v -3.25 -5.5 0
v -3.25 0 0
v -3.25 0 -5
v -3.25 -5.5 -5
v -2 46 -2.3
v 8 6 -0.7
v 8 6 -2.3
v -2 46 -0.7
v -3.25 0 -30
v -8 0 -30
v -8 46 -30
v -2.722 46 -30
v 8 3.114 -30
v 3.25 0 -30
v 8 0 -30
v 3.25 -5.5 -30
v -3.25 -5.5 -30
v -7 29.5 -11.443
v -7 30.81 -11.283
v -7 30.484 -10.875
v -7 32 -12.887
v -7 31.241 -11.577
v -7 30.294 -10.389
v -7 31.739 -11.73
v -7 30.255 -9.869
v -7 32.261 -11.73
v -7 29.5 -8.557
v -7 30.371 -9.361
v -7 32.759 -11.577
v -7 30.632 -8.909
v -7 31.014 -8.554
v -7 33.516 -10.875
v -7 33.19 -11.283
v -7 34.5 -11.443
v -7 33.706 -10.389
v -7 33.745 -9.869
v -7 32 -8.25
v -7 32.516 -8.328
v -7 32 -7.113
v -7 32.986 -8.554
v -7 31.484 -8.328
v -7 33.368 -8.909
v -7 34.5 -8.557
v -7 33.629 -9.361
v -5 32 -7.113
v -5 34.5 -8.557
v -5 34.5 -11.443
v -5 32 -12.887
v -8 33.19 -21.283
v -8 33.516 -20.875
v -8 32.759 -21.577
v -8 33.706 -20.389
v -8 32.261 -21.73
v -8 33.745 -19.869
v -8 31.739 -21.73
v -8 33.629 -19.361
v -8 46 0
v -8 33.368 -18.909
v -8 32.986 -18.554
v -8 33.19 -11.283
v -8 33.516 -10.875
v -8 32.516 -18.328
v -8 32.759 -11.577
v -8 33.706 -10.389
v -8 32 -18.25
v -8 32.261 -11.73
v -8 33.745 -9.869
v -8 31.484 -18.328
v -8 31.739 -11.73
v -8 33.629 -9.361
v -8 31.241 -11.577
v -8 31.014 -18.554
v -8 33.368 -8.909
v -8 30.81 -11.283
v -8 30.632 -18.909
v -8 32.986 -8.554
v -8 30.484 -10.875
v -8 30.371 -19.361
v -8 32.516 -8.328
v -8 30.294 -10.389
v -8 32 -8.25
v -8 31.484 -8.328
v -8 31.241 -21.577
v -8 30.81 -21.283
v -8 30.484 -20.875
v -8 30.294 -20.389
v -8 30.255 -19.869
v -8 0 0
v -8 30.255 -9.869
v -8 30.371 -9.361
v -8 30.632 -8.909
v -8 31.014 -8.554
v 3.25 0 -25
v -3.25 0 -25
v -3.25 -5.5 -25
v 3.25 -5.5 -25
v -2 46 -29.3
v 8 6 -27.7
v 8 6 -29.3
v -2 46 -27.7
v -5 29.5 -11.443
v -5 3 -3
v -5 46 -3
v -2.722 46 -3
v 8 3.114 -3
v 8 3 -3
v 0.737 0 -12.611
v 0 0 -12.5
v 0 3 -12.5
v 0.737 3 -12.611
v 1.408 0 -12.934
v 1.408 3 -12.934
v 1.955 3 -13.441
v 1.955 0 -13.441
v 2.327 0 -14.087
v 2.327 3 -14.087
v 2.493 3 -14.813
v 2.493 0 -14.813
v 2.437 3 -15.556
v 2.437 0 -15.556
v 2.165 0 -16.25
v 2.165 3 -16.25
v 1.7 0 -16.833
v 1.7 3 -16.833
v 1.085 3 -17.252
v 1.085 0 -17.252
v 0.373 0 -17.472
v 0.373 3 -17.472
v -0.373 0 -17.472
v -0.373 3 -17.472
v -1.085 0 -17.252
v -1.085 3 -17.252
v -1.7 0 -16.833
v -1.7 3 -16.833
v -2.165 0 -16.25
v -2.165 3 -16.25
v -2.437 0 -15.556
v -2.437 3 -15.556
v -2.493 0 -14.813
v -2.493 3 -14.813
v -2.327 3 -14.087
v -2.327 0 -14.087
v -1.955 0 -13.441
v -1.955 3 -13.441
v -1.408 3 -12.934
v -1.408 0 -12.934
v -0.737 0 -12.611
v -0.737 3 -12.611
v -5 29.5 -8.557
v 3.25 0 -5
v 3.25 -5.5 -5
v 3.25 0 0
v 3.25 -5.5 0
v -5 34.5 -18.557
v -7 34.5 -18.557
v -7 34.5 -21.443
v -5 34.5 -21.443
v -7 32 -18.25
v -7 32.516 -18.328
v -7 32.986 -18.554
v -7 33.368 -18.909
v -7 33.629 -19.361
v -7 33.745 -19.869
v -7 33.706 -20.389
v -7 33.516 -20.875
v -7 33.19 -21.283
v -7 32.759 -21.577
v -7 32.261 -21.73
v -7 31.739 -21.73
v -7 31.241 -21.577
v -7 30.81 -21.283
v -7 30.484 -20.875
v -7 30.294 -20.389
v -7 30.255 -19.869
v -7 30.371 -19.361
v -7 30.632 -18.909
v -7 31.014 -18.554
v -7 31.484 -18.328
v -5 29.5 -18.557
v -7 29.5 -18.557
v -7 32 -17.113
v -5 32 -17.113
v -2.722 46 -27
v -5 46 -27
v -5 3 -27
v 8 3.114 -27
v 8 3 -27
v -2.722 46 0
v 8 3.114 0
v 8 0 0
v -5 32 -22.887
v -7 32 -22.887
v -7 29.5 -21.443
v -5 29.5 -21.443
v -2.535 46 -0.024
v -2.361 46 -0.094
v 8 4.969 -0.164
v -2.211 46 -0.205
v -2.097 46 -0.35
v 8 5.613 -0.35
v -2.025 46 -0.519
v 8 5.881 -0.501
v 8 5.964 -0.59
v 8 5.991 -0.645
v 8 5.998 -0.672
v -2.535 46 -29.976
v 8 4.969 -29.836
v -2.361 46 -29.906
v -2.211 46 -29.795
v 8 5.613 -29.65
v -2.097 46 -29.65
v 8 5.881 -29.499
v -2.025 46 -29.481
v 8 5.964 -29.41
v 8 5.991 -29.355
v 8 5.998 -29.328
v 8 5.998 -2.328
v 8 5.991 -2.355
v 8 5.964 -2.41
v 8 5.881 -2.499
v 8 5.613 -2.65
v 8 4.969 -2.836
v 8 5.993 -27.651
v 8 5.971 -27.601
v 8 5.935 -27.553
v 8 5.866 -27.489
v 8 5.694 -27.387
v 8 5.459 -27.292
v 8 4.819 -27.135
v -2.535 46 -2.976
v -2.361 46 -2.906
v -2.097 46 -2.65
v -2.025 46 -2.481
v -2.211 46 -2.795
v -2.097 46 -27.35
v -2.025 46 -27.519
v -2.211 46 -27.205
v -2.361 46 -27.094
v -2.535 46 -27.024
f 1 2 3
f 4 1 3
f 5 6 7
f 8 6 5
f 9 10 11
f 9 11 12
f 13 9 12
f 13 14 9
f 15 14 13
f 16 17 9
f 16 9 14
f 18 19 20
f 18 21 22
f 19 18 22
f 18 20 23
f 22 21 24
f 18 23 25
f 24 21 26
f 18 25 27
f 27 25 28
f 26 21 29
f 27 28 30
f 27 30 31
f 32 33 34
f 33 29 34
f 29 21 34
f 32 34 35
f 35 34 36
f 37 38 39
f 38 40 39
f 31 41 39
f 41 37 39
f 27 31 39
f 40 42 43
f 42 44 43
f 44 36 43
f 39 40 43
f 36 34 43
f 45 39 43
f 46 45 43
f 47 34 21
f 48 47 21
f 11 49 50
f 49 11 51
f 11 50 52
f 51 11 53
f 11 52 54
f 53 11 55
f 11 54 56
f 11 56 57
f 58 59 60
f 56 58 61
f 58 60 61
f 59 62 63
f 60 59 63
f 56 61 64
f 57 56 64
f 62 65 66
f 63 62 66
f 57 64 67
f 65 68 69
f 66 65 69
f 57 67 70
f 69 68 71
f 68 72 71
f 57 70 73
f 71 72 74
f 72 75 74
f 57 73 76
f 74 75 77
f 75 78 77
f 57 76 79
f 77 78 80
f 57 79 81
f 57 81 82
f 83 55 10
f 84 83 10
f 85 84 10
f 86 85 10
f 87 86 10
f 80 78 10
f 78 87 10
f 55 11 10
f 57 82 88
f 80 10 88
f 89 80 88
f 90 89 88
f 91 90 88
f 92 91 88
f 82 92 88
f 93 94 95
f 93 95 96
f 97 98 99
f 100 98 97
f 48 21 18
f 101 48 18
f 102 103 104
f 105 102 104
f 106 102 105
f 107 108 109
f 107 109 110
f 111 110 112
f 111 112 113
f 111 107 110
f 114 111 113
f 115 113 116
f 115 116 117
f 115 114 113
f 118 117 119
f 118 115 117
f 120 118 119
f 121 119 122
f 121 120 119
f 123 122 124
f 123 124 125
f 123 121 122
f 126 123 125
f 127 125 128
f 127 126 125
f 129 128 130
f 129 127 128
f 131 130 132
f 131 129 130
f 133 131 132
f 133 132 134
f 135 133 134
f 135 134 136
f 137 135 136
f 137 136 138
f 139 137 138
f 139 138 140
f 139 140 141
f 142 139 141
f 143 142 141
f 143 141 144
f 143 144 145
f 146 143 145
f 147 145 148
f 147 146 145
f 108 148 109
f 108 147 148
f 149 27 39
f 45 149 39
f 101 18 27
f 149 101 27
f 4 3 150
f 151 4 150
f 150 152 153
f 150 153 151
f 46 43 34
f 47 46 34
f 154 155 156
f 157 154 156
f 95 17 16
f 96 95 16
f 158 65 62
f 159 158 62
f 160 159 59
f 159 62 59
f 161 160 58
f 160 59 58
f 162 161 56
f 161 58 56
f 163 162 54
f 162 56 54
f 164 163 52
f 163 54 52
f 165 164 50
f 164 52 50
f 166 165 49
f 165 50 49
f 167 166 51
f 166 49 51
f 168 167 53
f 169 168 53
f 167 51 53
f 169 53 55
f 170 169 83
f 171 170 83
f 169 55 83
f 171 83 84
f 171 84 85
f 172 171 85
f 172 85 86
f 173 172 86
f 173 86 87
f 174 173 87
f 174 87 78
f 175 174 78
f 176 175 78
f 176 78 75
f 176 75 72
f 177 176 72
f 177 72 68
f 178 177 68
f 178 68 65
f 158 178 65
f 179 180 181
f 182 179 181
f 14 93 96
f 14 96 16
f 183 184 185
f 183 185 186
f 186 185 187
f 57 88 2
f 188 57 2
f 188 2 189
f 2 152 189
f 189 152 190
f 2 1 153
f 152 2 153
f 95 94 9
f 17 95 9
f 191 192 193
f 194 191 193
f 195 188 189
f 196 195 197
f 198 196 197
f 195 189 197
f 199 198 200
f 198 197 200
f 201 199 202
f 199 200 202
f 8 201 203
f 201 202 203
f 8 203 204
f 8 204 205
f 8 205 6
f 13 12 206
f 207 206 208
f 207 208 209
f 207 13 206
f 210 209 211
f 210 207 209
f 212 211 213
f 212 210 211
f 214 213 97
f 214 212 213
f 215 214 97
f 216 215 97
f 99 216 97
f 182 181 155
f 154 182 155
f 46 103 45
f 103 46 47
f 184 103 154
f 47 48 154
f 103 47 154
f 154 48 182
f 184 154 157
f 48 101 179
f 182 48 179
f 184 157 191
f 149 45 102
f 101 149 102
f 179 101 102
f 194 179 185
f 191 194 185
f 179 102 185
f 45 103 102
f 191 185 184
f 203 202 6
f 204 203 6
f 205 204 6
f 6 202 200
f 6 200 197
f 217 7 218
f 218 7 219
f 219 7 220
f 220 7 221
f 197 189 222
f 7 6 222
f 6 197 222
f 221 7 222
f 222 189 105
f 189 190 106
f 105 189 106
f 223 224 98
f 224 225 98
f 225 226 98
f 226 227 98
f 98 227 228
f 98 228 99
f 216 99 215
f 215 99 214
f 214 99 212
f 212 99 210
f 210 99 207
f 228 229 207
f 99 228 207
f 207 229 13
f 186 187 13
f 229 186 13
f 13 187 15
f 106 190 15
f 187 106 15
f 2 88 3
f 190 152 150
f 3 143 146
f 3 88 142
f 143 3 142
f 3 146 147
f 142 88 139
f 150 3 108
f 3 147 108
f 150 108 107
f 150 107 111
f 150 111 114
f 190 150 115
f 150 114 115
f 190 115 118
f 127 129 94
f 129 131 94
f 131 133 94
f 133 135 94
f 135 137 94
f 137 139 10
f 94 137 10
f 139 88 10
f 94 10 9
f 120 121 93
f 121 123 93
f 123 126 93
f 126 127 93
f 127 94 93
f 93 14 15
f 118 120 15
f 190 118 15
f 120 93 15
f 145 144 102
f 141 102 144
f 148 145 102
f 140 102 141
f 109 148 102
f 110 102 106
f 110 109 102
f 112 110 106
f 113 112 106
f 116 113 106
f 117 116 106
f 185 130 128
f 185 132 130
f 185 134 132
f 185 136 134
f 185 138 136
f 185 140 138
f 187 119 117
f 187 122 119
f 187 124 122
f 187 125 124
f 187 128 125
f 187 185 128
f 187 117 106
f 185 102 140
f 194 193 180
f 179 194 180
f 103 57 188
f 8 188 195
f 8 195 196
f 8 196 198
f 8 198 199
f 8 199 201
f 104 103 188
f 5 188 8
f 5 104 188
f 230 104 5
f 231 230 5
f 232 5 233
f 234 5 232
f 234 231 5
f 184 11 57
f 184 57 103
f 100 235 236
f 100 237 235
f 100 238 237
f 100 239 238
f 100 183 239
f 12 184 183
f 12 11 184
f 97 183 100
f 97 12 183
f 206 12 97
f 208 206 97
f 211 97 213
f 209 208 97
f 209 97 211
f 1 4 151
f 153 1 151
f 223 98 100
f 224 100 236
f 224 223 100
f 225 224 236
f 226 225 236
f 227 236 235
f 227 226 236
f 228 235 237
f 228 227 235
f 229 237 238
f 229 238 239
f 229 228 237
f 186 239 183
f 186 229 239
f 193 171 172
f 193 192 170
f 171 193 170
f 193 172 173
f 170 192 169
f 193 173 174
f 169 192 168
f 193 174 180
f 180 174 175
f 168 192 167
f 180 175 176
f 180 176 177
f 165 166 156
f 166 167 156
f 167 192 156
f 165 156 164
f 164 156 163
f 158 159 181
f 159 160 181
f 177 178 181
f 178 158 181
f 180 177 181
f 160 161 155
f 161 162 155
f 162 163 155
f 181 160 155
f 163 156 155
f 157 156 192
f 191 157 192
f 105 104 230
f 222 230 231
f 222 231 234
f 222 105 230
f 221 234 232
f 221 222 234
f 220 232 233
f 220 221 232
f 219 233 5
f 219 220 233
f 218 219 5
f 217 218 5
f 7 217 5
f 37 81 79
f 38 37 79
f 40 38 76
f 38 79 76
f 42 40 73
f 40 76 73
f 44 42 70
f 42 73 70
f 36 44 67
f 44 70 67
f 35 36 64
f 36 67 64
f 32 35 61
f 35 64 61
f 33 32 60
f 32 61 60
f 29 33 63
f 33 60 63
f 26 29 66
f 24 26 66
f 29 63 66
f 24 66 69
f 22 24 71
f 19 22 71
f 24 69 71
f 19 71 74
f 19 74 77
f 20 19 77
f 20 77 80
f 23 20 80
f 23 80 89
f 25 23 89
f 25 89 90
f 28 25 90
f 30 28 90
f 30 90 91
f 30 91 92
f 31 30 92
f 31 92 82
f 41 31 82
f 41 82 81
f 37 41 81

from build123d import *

# Parameters (mm, degrees)
SKETCH1_R               = 2.5
SKETCH1_W               = 6.5
SKETCH1_H               = 5
BOSS_EXTRUDE1_DEPTH     = 3
SKETCH1_3_W             = 6.5
SKETCH1_3_H             = 5
BOSS_EXTRUDE2_DEPTH     = 5.5
BOSS_EXTRUDE3_START     = -3
SKETCH2_W               = 3
SKETCH2_H               = 24
SKETCH2_H_2             = 3
SKETCH2_W_2             = 13
BOSS_EXTRUDE3_DEPTH     = 46
CUT_EXTRUDE1_DEPTH      = 56.497747702
CUT_EXTRUDE1_DEPTH_BACK = 56.497747702
CUT_EXTRUDE2_START      = -1
SKETCH4_R               = 1.75
CUT_EXTRUDE2_DEPTH      = 57.201398584
SKETCH4_2_R             = 1.75
CUT_EXTRUDE3_DEPTH      = 58.201398584
FILLET1_R               = 0.7


with BuildPart() as part:
    # Sketch1 → Boss-Extrude1 (new body)
    # profile 1 of 3: a face of its own
    with BuildSketch(Plane(origin=(0, 0, 0), x_dir=(1, 0, 0), z_dir=(0, 1, 0))):
        Polygon((-8, 30), (-8, 0), (-3.25, 0), (-3.25, 5), (3.25, 5), (3.25, 0), (8, 0), (8, 30), (3.25, 30), (3.25, 25), (-3.25, 25), (-3.25, 30), align=None)
        with Locations(Location((0, 15, 0), (0, 0, 270))):
            Circle(SKETCH1_R, mode=Mode.SUBTRACT)
    # profile 2 of 3: a face of its own
    with BuildSketch(Plane(origin=(0, 0, 0), x_dir=(1, 0, 0), z_dir=(0, 1, 0))):
        with Locations((0, 2.5)):
            Rectangle(SKETCH1_W, SKETCH1_H)
    # profile 3 of 3: a face of its own
    with BuildSketch(Plane(origin=(0, 0, 0), x_dir=(1, 0, 0), z_dir=(0, 1, 0))):
        with Locations((0, 27.5)):
            Rectangle(SKETCH1_W, SKETCH1_H)
    extrude(amount=BOSS_EXTRUDE1_DEPTH)

    # Sketch1<3> → Boss-Extrude2 (add)
    with BuildSketch(Plane(origin=(0, 0, 0), x_dir=(1, 0, 0), z_dir=(0, 1, 0))):
        with Locations((0, 27.5)):
            Rectangle(SKETCH1_3_W, SKETCH1_3_H)
        with Locations((0, 2.5)):
            Rectangle(SKETCH1_3_W, SKETCH1_3_H)
    extrude(amount=-BOSS_EXTRUDE2_DEPTH)

    # Sketch2 → Boss-Extrude3 (add)
    with BuildSketch(Plane(origin=(0, 3, 0), x_dir=(1, 0, 0), z_dir=(0, 1, 0)).offset(BOSS_EXTRUDE3_START)):
        with Locations((-6.5, 15)):
            Rectangle(SKETCH2_W, SKETCH2_H)
        with Locations((-6.5, 1.5)):
            Rectangle(SKETCH2_W, SKETCH2_H_2)
        with Locations((-6.5, 28.5)):
            Rectangle(SKETCH2_W, SKETCH2_H_2)
        with Locations((1.5, 28.5)):
            Rectangle(SKETCH2_W_2, SKETCH2_H_2)
        with Locations((1.5, 1.5)):
            Rectangle(SKETCH2_W_2, SKETCH2_H_2)
    extrude(amount=BOSS_EXTRUDE3_DEPTH)

    # Sketch3 → Cut-Extrude1 (cut, two sides: drawn at the far end of the back side and taken through both)
    with BuildSketch(Plane(origin=(0, 0, -30), x_dir=(-1, 0, 0), z_dir=(0, 0, -1)).offset(-CUT_EXTRUDE1_DEPTH_BACK)):
        Polygon((-8, 6), (2, 46), (-8, 46), align=None)
    extrude(amount=CUT_EXTRUDE1_DEPTH + CUT_EXTRUDE1_DEPTH_BACK, mode=Mode.SUBTRACT)

    # Sketch4 → Cut-Extrude2 (cut, through all)
    # profile 1 of 2: a face of its own
    with BuildSketch(Plane.ZY.offset(8).offset(CUT_EXTRUDE2_START)):
        Polygon((-8.556624327, 29.5), (-7.113248654, 32), (-8.556624327, 34.5), (-11.443375673, 34.5), (-12.886751346, 32), (-11.443375673, 29.5), align=None)
        with Locations((-10, 32)):
            Circle(SKETCH4_R, mode=Mode.SUBTRACT)
    # profile 2 of 2: a face of its own
    with BuildSketch(Plane.ZY.offset(8).offset(CUT_EXTRUDE2_START)):
        Polygon((-18.556624327, 29.5), (-17.113248654, 32), (-18.556624327, 34.5), (-21.443375673, 34.5), (-22.886751346, 32), (-21.443375673, 29.5), align=None)
        with Locations((-20, 32)):
            Circle(SKETCH4_R, mode=Mode.SUBTRACT)
    extrude(amount=-CUT_EXTRUDE2_DEPTH, mode=Mode.SUBTRACT)

    # Sketch4<2> → Cut-Extrude3 (cut, through all)
    with BuildSketch(Plane.ZY.offset(8)):
        with Locations((-20, 32)):
            Circle(SKETCH4_2_R)
        with Locations((-10, 32)):
            Circle(SKETCH4_2_R)
    extrude(amount=-CUT_EXTRUDE3_DEPTH, mode=Mode.SUBTRACT)

    # Fillet1
    fillet1_edges = [part.edges().sort_by_distance(p)[0] for p in [
        (3, 26, -30),
        (3, 26, -27),
        (3, 26, 0),
        (3, 26, -3),
    ]]
    fillet(fillet1_edges, radius=FILLET1_R)


solid = part.part
